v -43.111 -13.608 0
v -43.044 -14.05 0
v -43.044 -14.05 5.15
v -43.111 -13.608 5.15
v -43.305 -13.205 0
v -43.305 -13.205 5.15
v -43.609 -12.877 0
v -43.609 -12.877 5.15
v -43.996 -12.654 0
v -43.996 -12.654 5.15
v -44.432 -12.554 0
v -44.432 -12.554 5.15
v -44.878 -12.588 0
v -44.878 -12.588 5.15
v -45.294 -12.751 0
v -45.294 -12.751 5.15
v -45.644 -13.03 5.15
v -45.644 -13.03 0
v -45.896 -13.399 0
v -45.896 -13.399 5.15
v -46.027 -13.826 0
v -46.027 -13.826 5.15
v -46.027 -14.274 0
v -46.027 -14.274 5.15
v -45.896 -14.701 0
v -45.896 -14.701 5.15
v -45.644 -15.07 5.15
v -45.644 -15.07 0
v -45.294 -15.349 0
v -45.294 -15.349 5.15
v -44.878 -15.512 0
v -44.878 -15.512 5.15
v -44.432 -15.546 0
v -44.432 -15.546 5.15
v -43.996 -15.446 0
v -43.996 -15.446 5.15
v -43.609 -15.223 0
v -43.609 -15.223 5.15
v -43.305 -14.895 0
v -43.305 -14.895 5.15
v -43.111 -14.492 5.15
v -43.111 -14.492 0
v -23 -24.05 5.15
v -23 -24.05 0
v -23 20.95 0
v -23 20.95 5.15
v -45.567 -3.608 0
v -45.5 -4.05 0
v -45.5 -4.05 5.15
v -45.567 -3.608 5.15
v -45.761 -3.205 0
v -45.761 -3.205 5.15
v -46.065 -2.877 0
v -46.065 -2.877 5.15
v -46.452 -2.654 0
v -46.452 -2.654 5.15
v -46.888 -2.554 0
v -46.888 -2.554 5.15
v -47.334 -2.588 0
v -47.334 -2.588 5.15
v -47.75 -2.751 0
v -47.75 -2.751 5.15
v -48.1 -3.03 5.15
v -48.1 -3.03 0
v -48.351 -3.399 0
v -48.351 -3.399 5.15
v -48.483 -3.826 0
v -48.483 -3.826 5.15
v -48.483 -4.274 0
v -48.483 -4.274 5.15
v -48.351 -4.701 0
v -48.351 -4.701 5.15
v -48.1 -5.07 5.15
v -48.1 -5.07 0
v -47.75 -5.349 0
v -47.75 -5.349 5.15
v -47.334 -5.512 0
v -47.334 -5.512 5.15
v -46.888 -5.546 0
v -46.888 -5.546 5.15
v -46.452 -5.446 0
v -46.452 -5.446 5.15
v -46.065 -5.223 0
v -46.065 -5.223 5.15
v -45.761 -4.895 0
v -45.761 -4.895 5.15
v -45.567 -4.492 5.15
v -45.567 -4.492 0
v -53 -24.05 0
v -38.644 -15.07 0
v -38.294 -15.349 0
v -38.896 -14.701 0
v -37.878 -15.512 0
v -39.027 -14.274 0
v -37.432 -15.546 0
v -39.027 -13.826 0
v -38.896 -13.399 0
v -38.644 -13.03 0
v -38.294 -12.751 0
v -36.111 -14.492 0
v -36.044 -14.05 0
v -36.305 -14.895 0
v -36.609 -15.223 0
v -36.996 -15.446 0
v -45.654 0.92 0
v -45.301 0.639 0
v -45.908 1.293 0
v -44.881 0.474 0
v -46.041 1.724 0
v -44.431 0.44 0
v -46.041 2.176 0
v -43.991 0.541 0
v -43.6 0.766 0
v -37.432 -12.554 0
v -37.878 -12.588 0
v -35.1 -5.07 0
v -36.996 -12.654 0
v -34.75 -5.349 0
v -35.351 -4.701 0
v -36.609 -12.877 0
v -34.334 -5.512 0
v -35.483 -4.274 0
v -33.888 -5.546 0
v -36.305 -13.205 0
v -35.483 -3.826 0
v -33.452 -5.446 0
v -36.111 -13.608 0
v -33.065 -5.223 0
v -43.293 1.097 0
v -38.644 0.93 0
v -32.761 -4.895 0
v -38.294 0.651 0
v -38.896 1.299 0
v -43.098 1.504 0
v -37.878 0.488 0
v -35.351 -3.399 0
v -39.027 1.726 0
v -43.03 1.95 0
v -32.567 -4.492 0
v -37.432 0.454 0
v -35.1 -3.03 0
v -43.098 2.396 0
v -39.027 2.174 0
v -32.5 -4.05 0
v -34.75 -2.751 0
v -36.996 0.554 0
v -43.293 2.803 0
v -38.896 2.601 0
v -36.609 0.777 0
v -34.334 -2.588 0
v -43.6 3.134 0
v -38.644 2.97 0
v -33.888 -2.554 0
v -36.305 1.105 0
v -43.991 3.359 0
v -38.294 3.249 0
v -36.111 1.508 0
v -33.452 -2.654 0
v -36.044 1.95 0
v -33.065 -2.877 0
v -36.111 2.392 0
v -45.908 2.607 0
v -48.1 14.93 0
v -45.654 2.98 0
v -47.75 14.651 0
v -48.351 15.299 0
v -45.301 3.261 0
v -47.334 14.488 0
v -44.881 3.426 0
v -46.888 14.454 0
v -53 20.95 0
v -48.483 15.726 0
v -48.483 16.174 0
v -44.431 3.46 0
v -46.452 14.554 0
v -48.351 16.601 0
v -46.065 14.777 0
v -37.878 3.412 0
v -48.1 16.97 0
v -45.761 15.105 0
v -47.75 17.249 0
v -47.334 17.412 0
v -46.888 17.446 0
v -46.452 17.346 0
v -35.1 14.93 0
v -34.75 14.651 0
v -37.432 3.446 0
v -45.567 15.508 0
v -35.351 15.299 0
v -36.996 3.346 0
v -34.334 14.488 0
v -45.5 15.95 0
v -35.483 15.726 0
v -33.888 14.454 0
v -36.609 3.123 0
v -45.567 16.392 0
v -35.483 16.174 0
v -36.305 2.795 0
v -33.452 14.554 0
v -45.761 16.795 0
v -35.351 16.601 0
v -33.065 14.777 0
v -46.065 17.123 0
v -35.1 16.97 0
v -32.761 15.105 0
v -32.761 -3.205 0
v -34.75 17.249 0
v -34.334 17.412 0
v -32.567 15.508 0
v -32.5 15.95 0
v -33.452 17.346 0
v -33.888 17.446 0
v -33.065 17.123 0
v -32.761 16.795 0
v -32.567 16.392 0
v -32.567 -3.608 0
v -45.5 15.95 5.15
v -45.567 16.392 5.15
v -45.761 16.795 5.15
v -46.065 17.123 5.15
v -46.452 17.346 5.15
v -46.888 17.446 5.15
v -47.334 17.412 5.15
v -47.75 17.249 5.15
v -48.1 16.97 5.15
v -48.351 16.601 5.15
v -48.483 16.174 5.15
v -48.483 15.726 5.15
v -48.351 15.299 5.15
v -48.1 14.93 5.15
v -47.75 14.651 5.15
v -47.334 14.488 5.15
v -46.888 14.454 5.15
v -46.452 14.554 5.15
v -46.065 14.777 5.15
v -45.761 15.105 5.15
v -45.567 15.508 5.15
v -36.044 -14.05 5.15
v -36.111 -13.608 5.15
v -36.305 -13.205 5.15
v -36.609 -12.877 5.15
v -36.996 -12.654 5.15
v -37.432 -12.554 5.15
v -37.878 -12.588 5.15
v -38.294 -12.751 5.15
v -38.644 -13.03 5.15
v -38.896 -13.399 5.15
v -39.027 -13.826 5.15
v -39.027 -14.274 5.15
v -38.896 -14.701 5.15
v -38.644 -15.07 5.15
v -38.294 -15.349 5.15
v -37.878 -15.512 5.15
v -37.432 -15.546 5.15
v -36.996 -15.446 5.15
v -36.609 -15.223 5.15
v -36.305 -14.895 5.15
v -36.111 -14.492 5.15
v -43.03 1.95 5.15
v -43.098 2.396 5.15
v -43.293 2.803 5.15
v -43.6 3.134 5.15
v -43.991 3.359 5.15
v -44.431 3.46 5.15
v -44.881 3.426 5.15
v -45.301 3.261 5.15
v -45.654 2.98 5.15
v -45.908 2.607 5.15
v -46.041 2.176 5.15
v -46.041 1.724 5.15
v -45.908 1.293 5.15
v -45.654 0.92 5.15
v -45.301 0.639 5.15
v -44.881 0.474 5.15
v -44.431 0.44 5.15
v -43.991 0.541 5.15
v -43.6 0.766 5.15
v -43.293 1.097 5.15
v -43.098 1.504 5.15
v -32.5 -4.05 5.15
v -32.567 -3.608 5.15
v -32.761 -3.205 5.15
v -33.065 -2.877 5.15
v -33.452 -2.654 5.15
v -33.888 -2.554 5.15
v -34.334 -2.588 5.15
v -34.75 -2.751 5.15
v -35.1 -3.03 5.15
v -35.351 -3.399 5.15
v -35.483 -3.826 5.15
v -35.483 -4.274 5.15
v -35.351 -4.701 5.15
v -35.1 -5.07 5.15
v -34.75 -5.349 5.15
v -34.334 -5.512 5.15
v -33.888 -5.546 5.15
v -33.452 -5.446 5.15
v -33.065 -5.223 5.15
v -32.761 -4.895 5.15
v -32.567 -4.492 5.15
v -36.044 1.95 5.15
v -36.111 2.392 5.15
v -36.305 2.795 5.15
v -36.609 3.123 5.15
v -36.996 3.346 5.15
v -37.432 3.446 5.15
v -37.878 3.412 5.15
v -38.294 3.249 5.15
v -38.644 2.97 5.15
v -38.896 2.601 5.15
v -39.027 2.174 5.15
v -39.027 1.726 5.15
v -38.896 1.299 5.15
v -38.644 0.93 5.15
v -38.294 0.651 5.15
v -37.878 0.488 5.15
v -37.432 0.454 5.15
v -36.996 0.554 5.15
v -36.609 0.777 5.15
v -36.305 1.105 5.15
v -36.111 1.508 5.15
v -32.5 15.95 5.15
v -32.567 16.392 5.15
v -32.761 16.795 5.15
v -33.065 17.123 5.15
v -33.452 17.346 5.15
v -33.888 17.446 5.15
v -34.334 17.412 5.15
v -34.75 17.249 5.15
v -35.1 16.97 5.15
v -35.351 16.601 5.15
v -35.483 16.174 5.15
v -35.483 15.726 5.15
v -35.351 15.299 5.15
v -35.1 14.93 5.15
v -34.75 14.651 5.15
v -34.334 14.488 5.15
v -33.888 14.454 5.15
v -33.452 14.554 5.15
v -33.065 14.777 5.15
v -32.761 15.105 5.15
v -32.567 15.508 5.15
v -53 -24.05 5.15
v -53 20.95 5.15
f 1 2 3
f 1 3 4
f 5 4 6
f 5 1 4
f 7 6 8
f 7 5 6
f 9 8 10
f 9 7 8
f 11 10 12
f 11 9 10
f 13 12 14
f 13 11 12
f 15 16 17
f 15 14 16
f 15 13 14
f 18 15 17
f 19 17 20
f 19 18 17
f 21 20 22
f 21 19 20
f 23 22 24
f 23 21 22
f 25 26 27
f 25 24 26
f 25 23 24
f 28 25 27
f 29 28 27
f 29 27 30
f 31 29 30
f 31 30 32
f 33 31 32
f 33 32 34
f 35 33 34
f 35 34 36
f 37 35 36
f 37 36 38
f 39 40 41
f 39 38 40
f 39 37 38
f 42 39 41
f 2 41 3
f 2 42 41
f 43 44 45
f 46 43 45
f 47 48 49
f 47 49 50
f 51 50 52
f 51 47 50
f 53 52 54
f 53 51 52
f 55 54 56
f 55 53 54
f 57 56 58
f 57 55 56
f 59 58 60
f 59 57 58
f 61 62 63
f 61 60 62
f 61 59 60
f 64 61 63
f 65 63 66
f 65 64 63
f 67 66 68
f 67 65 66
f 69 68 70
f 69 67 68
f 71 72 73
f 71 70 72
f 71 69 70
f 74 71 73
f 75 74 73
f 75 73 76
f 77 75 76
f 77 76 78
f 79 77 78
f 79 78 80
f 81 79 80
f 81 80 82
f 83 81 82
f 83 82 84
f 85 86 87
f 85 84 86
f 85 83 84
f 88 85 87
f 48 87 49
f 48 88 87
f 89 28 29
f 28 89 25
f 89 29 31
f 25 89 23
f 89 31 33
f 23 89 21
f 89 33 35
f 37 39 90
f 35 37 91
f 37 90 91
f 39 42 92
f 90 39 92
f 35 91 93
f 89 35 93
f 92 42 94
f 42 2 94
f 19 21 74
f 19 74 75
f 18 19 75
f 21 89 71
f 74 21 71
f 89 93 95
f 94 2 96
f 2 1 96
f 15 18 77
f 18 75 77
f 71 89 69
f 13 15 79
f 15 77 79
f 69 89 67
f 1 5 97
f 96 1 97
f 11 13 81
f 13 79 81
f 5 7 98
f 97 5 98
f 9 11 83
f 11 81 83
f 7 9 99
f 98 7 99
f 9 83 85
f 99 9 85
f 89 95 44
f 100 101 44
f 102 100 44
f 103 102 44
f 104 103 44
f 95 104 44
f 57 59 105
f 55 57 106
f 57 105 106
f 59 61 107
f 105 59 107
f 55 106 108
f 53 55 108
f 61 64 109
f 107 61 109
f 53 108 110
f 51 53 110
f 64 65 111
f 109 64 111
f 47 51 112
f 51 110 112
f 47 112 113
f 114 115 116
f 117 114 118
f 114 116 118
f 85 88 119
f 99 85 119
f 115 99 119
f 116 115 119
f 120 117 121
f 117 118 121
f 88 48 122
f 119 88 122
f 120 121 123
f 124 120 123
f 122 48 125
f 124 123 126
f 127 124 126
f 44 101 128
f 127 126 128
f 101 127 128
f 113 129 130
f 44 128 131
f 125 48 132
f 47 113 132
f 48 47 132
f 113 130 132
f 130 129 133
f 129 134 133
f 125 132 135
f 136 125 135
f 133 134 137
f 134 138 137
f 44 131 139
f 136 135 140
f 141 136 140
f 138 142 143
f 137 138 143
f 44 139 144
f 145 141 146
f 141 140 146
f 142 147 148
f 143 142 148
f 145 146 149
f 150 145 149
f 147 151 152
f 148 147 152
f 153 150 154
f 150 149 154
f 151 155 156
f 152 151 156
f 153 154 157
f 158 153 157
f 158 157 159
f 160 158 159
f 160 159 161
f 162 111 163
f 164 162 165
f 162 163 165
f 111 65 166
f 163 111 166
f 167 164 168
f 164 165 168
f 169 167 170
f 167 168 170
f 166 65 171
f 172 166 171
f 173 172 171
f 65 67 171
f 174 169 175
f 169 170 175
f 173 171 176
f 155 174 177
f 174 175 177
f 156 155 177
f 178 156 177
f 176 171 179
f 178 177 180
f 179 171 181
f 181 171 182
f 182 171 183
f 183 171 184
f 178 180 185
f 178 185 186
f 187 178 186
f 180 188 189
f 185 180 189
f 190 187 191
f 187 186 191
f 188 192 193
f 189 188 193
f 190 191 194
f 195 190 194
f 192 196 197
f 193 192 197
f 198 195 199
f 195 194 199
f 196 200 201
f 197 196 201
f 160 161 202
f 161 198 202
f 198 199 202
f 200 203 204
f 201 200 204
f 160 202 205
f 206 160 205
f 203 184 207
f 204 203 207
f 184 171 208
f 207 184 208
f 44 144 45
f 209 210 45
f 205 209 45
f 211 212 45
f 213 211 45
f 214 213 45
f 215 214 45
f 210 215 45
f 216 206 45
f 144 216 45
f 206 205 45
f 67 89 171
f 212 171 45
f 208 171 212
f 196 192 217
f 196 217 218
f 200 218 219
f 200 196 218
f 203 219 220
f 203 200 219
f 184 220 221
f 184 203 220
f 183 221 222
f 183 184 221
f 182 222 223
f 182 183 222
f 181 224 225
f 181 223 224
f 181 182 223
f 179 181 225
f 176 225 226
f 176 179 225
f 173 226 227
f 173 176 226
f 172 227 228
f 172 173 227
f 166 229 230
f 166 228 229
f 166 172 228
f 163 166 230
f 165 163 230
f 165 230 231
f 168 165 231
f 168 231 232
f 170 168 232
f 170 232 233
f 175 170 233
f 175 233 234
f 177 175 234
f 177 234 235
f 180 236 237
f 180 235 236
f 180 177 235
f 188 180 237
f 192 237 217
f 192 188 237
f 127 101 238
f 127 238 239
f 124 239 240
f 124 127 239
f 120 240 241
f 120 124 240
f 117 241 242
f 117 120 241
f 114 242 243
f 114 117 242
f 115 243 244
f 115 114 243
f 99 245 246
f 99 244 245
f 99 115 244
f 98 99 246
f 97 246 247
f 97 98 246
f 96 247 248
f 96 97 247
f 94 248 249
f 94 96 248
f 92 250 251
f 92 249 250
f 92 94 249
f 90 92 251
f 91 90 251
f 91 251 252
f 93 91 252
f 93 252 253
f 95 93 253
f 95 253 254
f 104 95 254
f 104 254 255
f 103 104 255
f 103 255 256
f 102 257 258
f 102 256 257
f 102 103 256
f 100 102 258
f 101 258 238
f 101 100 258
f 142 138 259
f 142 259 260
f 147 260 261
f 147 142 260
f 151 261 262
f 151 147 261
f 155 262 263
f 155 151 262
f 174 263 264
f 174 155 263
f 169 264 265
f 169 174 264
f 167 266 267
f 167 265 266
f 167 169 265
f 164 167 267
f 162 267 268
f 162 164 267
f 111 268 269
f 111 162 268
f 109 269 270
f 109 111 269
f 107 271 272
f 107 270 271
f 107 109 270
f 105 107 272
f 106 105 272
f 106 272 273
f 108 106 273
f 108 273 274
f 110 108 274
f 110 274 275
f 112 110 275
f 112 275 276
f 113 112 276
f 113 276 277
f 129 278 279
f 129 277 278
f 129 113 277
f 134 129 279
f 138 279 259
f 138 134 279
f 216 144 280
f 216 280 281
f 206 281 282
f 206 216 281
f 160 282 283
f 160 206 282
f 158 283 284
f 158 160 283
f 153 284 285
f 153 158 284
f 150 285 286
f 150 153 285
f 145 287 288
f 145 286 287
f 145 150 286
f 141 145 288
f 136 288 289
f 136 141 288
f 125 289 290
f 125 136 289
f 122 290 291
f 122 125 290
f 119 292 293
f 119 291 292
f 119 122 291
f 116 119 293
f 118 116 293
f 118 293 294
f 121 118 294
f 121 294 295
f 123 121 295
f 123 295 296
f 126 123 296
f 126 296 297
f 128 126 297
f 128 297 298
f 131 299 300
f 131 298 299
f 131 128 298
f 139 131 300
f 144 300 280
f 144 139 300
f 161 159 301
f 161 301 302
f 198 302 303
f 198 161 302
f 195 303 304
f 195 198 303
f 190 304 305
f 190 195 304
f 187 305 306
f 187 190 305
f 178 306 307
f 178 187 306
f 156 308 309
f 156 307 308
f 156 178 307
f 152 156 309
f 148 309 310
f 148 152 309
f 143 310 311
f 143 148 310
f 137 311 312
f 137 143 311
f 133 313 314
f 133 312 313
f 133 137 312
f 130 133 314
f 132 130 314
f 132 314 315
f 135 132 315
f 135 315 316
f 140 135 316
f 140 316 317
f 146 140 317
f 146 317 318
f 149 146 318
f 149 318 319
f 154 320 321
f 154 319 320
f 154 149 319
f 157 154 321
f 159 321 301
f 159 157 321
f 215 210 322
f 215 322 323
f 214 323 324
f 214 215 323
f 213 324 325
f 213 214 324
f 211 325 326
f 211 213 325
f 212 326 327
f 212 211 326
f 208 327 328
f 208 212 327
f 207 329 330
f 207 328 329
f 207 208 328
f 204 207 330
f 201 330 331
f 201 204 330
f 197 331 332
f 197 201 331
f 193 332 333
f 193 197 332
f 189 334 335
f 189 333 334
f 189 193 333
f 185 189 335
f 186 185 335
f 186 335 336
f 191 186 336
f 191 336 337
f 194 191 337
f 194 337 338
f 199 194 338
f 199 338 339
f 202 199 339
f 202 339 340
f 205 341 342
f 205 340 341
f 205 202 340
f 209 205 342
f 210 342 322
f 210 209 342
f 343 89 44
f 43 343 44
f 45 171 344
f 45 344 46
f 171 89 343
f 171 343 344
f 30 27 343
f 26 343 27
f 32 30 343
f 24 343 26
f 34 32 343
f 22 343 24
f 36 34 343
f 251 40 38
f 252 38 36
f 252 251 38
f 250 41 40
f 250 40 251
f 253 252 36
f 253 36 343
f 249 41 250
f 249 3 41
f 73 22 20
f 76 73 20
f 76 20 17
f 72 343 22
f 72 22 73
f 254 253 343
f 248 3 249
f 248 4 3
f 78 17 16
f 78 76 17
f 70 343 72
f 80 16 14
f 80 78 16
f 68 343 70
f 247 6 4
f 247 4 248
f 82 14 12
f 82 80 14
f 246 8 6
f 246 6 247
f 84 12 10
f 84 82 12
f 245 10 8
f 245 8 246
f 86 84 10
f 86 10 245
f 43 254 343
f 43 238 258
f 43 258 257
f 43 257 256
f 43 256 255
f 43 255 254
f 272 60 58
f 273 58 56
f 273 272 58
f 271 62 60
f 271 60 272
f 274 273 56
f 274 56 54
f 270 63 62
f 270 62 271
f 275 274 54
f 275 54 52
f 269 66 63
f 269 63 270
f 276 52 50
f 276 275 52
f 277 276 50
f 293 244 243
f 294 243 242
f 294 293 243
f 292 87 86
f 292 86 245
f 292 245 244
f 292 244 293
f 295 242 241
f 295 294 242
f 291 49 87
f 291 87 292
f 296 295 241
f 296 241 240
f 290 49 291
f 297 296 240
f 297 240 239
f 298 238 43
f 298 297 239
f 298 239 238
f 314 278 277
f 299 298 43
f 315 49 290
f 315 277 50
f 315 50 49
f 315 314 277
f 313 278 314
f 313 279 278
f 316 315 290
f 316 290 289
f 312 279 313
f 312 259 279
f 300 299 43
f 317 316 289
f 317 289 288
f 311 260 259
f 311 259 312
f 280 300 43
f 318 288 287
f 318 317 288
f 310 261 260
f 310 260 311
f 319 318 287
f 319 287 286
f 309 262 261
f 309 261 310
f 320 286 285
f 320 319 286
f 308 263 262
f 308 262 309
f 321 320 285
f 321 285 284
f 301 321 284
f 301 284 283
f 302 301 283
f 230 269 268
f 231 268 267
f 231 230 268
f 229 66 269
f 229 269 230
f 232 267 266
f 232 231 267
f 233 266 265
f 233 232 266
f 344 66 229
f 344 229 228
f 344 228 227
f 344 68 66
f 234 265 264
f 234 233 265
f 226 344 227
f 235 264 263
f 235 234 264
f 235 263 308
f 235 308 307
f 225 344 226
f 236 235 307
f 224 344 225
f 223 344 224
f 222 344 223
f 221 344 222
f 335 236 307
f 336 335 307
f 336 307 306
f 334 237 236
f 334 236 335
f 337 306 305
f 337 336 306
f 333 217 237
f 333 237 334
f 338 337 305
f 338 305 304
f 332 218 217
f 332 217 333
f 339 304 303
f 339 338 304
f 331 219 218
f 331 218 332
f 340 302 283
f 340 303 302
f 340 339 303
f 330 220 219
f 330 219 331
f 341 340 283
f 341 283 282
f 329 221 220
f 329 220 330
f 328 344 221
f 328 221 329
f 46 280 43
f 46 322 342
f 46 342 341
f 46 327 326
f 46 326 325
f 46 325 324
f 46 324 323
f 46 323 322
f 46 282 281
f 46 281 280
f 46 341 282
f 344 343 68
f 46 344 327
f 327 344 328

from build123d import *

# Parameters (mm, degrees)
SKETCH_1_W               = 30
SKETCH_1_H               = 45
EXTRUDE_1_DEPTH          = 5.15
CUT_EXTRUDE_1_DEPTH      = 59.428802829
CUT_EXTRUDE_1_DEPTH_BACK = 59.428802829
SKETCH_2_R               = 1.5
CUT_EXTRUDE_2_DEPTH      = 59.428802829
CUT_EXTRUDE_2_DEPTH_BACK = 59.428802829
SKETCH_3_R               = 1.5
SKETCH_3_R_2             = 1.513831086


with BuildPart() as part:
    # 草图1 → 凸台-拉伸1 (new body)
    with BuildSketch(Plane.XY):
        with Locations((-38, -1.55)):
            Rectangle(SKETCH_1_W, SKETCH_1_H)
    extrude(amount=EXTRUDE_1_DEPTH)

    # 草图2 → 切除-拉伸1 (cut, two sides: drawn at the far end of the back side and taken through both)
    with BuildSketch(Plane.XY.offset(5.15).offset(-CUT_EXTRUDE_1_DEPTH_BACK)):
        with Locations((-34, 15.95)):
            Circle(SKETCH_2_R)
        with Locations((-47, 15.95)):
            Circle(SKETCH_2_R)
        with Locations((-34, -4.05)):
            Circle(SKETCH_2_R)
        with Locations((-47, -4.05)):
            Circle(SKETCH_2_R)
    extrude(amount=CUT_EXTRUDE_1_DEPTH + CUT_EXTRUDE_1_DEPTH_BACK, mode=Mode.SUBTRACT)

    # 草图3 → 切除-拉伸2 (cut, two sides: drawn at the far end of the back side and taken through both)
    with BuildSketch(Plane.XY.offset(5.15).offset(-CUT_EXTRUDE_2_DEPTH_BACK)):
        with Locations((-44.544155877, -14.05)):
            Circle(SKETCH_3_R)
        with Locations((-37.544155877, -14.05)):
            Circle(SKETCH_3_R)
        with Locations((-44.544155877, 1.95)):
            Circle(SKETCH_3_R_2)
        with Locations((-37.544155877, 1.95)):
            Circle(SKETCH_3_R)
    extrude(amount=CUT_EXTRUDE_2_DEPTH + CUT_EXTRUDE_2_DEPTH_BACK, mode=Mode.SUBTRACT)


solid = part.part
